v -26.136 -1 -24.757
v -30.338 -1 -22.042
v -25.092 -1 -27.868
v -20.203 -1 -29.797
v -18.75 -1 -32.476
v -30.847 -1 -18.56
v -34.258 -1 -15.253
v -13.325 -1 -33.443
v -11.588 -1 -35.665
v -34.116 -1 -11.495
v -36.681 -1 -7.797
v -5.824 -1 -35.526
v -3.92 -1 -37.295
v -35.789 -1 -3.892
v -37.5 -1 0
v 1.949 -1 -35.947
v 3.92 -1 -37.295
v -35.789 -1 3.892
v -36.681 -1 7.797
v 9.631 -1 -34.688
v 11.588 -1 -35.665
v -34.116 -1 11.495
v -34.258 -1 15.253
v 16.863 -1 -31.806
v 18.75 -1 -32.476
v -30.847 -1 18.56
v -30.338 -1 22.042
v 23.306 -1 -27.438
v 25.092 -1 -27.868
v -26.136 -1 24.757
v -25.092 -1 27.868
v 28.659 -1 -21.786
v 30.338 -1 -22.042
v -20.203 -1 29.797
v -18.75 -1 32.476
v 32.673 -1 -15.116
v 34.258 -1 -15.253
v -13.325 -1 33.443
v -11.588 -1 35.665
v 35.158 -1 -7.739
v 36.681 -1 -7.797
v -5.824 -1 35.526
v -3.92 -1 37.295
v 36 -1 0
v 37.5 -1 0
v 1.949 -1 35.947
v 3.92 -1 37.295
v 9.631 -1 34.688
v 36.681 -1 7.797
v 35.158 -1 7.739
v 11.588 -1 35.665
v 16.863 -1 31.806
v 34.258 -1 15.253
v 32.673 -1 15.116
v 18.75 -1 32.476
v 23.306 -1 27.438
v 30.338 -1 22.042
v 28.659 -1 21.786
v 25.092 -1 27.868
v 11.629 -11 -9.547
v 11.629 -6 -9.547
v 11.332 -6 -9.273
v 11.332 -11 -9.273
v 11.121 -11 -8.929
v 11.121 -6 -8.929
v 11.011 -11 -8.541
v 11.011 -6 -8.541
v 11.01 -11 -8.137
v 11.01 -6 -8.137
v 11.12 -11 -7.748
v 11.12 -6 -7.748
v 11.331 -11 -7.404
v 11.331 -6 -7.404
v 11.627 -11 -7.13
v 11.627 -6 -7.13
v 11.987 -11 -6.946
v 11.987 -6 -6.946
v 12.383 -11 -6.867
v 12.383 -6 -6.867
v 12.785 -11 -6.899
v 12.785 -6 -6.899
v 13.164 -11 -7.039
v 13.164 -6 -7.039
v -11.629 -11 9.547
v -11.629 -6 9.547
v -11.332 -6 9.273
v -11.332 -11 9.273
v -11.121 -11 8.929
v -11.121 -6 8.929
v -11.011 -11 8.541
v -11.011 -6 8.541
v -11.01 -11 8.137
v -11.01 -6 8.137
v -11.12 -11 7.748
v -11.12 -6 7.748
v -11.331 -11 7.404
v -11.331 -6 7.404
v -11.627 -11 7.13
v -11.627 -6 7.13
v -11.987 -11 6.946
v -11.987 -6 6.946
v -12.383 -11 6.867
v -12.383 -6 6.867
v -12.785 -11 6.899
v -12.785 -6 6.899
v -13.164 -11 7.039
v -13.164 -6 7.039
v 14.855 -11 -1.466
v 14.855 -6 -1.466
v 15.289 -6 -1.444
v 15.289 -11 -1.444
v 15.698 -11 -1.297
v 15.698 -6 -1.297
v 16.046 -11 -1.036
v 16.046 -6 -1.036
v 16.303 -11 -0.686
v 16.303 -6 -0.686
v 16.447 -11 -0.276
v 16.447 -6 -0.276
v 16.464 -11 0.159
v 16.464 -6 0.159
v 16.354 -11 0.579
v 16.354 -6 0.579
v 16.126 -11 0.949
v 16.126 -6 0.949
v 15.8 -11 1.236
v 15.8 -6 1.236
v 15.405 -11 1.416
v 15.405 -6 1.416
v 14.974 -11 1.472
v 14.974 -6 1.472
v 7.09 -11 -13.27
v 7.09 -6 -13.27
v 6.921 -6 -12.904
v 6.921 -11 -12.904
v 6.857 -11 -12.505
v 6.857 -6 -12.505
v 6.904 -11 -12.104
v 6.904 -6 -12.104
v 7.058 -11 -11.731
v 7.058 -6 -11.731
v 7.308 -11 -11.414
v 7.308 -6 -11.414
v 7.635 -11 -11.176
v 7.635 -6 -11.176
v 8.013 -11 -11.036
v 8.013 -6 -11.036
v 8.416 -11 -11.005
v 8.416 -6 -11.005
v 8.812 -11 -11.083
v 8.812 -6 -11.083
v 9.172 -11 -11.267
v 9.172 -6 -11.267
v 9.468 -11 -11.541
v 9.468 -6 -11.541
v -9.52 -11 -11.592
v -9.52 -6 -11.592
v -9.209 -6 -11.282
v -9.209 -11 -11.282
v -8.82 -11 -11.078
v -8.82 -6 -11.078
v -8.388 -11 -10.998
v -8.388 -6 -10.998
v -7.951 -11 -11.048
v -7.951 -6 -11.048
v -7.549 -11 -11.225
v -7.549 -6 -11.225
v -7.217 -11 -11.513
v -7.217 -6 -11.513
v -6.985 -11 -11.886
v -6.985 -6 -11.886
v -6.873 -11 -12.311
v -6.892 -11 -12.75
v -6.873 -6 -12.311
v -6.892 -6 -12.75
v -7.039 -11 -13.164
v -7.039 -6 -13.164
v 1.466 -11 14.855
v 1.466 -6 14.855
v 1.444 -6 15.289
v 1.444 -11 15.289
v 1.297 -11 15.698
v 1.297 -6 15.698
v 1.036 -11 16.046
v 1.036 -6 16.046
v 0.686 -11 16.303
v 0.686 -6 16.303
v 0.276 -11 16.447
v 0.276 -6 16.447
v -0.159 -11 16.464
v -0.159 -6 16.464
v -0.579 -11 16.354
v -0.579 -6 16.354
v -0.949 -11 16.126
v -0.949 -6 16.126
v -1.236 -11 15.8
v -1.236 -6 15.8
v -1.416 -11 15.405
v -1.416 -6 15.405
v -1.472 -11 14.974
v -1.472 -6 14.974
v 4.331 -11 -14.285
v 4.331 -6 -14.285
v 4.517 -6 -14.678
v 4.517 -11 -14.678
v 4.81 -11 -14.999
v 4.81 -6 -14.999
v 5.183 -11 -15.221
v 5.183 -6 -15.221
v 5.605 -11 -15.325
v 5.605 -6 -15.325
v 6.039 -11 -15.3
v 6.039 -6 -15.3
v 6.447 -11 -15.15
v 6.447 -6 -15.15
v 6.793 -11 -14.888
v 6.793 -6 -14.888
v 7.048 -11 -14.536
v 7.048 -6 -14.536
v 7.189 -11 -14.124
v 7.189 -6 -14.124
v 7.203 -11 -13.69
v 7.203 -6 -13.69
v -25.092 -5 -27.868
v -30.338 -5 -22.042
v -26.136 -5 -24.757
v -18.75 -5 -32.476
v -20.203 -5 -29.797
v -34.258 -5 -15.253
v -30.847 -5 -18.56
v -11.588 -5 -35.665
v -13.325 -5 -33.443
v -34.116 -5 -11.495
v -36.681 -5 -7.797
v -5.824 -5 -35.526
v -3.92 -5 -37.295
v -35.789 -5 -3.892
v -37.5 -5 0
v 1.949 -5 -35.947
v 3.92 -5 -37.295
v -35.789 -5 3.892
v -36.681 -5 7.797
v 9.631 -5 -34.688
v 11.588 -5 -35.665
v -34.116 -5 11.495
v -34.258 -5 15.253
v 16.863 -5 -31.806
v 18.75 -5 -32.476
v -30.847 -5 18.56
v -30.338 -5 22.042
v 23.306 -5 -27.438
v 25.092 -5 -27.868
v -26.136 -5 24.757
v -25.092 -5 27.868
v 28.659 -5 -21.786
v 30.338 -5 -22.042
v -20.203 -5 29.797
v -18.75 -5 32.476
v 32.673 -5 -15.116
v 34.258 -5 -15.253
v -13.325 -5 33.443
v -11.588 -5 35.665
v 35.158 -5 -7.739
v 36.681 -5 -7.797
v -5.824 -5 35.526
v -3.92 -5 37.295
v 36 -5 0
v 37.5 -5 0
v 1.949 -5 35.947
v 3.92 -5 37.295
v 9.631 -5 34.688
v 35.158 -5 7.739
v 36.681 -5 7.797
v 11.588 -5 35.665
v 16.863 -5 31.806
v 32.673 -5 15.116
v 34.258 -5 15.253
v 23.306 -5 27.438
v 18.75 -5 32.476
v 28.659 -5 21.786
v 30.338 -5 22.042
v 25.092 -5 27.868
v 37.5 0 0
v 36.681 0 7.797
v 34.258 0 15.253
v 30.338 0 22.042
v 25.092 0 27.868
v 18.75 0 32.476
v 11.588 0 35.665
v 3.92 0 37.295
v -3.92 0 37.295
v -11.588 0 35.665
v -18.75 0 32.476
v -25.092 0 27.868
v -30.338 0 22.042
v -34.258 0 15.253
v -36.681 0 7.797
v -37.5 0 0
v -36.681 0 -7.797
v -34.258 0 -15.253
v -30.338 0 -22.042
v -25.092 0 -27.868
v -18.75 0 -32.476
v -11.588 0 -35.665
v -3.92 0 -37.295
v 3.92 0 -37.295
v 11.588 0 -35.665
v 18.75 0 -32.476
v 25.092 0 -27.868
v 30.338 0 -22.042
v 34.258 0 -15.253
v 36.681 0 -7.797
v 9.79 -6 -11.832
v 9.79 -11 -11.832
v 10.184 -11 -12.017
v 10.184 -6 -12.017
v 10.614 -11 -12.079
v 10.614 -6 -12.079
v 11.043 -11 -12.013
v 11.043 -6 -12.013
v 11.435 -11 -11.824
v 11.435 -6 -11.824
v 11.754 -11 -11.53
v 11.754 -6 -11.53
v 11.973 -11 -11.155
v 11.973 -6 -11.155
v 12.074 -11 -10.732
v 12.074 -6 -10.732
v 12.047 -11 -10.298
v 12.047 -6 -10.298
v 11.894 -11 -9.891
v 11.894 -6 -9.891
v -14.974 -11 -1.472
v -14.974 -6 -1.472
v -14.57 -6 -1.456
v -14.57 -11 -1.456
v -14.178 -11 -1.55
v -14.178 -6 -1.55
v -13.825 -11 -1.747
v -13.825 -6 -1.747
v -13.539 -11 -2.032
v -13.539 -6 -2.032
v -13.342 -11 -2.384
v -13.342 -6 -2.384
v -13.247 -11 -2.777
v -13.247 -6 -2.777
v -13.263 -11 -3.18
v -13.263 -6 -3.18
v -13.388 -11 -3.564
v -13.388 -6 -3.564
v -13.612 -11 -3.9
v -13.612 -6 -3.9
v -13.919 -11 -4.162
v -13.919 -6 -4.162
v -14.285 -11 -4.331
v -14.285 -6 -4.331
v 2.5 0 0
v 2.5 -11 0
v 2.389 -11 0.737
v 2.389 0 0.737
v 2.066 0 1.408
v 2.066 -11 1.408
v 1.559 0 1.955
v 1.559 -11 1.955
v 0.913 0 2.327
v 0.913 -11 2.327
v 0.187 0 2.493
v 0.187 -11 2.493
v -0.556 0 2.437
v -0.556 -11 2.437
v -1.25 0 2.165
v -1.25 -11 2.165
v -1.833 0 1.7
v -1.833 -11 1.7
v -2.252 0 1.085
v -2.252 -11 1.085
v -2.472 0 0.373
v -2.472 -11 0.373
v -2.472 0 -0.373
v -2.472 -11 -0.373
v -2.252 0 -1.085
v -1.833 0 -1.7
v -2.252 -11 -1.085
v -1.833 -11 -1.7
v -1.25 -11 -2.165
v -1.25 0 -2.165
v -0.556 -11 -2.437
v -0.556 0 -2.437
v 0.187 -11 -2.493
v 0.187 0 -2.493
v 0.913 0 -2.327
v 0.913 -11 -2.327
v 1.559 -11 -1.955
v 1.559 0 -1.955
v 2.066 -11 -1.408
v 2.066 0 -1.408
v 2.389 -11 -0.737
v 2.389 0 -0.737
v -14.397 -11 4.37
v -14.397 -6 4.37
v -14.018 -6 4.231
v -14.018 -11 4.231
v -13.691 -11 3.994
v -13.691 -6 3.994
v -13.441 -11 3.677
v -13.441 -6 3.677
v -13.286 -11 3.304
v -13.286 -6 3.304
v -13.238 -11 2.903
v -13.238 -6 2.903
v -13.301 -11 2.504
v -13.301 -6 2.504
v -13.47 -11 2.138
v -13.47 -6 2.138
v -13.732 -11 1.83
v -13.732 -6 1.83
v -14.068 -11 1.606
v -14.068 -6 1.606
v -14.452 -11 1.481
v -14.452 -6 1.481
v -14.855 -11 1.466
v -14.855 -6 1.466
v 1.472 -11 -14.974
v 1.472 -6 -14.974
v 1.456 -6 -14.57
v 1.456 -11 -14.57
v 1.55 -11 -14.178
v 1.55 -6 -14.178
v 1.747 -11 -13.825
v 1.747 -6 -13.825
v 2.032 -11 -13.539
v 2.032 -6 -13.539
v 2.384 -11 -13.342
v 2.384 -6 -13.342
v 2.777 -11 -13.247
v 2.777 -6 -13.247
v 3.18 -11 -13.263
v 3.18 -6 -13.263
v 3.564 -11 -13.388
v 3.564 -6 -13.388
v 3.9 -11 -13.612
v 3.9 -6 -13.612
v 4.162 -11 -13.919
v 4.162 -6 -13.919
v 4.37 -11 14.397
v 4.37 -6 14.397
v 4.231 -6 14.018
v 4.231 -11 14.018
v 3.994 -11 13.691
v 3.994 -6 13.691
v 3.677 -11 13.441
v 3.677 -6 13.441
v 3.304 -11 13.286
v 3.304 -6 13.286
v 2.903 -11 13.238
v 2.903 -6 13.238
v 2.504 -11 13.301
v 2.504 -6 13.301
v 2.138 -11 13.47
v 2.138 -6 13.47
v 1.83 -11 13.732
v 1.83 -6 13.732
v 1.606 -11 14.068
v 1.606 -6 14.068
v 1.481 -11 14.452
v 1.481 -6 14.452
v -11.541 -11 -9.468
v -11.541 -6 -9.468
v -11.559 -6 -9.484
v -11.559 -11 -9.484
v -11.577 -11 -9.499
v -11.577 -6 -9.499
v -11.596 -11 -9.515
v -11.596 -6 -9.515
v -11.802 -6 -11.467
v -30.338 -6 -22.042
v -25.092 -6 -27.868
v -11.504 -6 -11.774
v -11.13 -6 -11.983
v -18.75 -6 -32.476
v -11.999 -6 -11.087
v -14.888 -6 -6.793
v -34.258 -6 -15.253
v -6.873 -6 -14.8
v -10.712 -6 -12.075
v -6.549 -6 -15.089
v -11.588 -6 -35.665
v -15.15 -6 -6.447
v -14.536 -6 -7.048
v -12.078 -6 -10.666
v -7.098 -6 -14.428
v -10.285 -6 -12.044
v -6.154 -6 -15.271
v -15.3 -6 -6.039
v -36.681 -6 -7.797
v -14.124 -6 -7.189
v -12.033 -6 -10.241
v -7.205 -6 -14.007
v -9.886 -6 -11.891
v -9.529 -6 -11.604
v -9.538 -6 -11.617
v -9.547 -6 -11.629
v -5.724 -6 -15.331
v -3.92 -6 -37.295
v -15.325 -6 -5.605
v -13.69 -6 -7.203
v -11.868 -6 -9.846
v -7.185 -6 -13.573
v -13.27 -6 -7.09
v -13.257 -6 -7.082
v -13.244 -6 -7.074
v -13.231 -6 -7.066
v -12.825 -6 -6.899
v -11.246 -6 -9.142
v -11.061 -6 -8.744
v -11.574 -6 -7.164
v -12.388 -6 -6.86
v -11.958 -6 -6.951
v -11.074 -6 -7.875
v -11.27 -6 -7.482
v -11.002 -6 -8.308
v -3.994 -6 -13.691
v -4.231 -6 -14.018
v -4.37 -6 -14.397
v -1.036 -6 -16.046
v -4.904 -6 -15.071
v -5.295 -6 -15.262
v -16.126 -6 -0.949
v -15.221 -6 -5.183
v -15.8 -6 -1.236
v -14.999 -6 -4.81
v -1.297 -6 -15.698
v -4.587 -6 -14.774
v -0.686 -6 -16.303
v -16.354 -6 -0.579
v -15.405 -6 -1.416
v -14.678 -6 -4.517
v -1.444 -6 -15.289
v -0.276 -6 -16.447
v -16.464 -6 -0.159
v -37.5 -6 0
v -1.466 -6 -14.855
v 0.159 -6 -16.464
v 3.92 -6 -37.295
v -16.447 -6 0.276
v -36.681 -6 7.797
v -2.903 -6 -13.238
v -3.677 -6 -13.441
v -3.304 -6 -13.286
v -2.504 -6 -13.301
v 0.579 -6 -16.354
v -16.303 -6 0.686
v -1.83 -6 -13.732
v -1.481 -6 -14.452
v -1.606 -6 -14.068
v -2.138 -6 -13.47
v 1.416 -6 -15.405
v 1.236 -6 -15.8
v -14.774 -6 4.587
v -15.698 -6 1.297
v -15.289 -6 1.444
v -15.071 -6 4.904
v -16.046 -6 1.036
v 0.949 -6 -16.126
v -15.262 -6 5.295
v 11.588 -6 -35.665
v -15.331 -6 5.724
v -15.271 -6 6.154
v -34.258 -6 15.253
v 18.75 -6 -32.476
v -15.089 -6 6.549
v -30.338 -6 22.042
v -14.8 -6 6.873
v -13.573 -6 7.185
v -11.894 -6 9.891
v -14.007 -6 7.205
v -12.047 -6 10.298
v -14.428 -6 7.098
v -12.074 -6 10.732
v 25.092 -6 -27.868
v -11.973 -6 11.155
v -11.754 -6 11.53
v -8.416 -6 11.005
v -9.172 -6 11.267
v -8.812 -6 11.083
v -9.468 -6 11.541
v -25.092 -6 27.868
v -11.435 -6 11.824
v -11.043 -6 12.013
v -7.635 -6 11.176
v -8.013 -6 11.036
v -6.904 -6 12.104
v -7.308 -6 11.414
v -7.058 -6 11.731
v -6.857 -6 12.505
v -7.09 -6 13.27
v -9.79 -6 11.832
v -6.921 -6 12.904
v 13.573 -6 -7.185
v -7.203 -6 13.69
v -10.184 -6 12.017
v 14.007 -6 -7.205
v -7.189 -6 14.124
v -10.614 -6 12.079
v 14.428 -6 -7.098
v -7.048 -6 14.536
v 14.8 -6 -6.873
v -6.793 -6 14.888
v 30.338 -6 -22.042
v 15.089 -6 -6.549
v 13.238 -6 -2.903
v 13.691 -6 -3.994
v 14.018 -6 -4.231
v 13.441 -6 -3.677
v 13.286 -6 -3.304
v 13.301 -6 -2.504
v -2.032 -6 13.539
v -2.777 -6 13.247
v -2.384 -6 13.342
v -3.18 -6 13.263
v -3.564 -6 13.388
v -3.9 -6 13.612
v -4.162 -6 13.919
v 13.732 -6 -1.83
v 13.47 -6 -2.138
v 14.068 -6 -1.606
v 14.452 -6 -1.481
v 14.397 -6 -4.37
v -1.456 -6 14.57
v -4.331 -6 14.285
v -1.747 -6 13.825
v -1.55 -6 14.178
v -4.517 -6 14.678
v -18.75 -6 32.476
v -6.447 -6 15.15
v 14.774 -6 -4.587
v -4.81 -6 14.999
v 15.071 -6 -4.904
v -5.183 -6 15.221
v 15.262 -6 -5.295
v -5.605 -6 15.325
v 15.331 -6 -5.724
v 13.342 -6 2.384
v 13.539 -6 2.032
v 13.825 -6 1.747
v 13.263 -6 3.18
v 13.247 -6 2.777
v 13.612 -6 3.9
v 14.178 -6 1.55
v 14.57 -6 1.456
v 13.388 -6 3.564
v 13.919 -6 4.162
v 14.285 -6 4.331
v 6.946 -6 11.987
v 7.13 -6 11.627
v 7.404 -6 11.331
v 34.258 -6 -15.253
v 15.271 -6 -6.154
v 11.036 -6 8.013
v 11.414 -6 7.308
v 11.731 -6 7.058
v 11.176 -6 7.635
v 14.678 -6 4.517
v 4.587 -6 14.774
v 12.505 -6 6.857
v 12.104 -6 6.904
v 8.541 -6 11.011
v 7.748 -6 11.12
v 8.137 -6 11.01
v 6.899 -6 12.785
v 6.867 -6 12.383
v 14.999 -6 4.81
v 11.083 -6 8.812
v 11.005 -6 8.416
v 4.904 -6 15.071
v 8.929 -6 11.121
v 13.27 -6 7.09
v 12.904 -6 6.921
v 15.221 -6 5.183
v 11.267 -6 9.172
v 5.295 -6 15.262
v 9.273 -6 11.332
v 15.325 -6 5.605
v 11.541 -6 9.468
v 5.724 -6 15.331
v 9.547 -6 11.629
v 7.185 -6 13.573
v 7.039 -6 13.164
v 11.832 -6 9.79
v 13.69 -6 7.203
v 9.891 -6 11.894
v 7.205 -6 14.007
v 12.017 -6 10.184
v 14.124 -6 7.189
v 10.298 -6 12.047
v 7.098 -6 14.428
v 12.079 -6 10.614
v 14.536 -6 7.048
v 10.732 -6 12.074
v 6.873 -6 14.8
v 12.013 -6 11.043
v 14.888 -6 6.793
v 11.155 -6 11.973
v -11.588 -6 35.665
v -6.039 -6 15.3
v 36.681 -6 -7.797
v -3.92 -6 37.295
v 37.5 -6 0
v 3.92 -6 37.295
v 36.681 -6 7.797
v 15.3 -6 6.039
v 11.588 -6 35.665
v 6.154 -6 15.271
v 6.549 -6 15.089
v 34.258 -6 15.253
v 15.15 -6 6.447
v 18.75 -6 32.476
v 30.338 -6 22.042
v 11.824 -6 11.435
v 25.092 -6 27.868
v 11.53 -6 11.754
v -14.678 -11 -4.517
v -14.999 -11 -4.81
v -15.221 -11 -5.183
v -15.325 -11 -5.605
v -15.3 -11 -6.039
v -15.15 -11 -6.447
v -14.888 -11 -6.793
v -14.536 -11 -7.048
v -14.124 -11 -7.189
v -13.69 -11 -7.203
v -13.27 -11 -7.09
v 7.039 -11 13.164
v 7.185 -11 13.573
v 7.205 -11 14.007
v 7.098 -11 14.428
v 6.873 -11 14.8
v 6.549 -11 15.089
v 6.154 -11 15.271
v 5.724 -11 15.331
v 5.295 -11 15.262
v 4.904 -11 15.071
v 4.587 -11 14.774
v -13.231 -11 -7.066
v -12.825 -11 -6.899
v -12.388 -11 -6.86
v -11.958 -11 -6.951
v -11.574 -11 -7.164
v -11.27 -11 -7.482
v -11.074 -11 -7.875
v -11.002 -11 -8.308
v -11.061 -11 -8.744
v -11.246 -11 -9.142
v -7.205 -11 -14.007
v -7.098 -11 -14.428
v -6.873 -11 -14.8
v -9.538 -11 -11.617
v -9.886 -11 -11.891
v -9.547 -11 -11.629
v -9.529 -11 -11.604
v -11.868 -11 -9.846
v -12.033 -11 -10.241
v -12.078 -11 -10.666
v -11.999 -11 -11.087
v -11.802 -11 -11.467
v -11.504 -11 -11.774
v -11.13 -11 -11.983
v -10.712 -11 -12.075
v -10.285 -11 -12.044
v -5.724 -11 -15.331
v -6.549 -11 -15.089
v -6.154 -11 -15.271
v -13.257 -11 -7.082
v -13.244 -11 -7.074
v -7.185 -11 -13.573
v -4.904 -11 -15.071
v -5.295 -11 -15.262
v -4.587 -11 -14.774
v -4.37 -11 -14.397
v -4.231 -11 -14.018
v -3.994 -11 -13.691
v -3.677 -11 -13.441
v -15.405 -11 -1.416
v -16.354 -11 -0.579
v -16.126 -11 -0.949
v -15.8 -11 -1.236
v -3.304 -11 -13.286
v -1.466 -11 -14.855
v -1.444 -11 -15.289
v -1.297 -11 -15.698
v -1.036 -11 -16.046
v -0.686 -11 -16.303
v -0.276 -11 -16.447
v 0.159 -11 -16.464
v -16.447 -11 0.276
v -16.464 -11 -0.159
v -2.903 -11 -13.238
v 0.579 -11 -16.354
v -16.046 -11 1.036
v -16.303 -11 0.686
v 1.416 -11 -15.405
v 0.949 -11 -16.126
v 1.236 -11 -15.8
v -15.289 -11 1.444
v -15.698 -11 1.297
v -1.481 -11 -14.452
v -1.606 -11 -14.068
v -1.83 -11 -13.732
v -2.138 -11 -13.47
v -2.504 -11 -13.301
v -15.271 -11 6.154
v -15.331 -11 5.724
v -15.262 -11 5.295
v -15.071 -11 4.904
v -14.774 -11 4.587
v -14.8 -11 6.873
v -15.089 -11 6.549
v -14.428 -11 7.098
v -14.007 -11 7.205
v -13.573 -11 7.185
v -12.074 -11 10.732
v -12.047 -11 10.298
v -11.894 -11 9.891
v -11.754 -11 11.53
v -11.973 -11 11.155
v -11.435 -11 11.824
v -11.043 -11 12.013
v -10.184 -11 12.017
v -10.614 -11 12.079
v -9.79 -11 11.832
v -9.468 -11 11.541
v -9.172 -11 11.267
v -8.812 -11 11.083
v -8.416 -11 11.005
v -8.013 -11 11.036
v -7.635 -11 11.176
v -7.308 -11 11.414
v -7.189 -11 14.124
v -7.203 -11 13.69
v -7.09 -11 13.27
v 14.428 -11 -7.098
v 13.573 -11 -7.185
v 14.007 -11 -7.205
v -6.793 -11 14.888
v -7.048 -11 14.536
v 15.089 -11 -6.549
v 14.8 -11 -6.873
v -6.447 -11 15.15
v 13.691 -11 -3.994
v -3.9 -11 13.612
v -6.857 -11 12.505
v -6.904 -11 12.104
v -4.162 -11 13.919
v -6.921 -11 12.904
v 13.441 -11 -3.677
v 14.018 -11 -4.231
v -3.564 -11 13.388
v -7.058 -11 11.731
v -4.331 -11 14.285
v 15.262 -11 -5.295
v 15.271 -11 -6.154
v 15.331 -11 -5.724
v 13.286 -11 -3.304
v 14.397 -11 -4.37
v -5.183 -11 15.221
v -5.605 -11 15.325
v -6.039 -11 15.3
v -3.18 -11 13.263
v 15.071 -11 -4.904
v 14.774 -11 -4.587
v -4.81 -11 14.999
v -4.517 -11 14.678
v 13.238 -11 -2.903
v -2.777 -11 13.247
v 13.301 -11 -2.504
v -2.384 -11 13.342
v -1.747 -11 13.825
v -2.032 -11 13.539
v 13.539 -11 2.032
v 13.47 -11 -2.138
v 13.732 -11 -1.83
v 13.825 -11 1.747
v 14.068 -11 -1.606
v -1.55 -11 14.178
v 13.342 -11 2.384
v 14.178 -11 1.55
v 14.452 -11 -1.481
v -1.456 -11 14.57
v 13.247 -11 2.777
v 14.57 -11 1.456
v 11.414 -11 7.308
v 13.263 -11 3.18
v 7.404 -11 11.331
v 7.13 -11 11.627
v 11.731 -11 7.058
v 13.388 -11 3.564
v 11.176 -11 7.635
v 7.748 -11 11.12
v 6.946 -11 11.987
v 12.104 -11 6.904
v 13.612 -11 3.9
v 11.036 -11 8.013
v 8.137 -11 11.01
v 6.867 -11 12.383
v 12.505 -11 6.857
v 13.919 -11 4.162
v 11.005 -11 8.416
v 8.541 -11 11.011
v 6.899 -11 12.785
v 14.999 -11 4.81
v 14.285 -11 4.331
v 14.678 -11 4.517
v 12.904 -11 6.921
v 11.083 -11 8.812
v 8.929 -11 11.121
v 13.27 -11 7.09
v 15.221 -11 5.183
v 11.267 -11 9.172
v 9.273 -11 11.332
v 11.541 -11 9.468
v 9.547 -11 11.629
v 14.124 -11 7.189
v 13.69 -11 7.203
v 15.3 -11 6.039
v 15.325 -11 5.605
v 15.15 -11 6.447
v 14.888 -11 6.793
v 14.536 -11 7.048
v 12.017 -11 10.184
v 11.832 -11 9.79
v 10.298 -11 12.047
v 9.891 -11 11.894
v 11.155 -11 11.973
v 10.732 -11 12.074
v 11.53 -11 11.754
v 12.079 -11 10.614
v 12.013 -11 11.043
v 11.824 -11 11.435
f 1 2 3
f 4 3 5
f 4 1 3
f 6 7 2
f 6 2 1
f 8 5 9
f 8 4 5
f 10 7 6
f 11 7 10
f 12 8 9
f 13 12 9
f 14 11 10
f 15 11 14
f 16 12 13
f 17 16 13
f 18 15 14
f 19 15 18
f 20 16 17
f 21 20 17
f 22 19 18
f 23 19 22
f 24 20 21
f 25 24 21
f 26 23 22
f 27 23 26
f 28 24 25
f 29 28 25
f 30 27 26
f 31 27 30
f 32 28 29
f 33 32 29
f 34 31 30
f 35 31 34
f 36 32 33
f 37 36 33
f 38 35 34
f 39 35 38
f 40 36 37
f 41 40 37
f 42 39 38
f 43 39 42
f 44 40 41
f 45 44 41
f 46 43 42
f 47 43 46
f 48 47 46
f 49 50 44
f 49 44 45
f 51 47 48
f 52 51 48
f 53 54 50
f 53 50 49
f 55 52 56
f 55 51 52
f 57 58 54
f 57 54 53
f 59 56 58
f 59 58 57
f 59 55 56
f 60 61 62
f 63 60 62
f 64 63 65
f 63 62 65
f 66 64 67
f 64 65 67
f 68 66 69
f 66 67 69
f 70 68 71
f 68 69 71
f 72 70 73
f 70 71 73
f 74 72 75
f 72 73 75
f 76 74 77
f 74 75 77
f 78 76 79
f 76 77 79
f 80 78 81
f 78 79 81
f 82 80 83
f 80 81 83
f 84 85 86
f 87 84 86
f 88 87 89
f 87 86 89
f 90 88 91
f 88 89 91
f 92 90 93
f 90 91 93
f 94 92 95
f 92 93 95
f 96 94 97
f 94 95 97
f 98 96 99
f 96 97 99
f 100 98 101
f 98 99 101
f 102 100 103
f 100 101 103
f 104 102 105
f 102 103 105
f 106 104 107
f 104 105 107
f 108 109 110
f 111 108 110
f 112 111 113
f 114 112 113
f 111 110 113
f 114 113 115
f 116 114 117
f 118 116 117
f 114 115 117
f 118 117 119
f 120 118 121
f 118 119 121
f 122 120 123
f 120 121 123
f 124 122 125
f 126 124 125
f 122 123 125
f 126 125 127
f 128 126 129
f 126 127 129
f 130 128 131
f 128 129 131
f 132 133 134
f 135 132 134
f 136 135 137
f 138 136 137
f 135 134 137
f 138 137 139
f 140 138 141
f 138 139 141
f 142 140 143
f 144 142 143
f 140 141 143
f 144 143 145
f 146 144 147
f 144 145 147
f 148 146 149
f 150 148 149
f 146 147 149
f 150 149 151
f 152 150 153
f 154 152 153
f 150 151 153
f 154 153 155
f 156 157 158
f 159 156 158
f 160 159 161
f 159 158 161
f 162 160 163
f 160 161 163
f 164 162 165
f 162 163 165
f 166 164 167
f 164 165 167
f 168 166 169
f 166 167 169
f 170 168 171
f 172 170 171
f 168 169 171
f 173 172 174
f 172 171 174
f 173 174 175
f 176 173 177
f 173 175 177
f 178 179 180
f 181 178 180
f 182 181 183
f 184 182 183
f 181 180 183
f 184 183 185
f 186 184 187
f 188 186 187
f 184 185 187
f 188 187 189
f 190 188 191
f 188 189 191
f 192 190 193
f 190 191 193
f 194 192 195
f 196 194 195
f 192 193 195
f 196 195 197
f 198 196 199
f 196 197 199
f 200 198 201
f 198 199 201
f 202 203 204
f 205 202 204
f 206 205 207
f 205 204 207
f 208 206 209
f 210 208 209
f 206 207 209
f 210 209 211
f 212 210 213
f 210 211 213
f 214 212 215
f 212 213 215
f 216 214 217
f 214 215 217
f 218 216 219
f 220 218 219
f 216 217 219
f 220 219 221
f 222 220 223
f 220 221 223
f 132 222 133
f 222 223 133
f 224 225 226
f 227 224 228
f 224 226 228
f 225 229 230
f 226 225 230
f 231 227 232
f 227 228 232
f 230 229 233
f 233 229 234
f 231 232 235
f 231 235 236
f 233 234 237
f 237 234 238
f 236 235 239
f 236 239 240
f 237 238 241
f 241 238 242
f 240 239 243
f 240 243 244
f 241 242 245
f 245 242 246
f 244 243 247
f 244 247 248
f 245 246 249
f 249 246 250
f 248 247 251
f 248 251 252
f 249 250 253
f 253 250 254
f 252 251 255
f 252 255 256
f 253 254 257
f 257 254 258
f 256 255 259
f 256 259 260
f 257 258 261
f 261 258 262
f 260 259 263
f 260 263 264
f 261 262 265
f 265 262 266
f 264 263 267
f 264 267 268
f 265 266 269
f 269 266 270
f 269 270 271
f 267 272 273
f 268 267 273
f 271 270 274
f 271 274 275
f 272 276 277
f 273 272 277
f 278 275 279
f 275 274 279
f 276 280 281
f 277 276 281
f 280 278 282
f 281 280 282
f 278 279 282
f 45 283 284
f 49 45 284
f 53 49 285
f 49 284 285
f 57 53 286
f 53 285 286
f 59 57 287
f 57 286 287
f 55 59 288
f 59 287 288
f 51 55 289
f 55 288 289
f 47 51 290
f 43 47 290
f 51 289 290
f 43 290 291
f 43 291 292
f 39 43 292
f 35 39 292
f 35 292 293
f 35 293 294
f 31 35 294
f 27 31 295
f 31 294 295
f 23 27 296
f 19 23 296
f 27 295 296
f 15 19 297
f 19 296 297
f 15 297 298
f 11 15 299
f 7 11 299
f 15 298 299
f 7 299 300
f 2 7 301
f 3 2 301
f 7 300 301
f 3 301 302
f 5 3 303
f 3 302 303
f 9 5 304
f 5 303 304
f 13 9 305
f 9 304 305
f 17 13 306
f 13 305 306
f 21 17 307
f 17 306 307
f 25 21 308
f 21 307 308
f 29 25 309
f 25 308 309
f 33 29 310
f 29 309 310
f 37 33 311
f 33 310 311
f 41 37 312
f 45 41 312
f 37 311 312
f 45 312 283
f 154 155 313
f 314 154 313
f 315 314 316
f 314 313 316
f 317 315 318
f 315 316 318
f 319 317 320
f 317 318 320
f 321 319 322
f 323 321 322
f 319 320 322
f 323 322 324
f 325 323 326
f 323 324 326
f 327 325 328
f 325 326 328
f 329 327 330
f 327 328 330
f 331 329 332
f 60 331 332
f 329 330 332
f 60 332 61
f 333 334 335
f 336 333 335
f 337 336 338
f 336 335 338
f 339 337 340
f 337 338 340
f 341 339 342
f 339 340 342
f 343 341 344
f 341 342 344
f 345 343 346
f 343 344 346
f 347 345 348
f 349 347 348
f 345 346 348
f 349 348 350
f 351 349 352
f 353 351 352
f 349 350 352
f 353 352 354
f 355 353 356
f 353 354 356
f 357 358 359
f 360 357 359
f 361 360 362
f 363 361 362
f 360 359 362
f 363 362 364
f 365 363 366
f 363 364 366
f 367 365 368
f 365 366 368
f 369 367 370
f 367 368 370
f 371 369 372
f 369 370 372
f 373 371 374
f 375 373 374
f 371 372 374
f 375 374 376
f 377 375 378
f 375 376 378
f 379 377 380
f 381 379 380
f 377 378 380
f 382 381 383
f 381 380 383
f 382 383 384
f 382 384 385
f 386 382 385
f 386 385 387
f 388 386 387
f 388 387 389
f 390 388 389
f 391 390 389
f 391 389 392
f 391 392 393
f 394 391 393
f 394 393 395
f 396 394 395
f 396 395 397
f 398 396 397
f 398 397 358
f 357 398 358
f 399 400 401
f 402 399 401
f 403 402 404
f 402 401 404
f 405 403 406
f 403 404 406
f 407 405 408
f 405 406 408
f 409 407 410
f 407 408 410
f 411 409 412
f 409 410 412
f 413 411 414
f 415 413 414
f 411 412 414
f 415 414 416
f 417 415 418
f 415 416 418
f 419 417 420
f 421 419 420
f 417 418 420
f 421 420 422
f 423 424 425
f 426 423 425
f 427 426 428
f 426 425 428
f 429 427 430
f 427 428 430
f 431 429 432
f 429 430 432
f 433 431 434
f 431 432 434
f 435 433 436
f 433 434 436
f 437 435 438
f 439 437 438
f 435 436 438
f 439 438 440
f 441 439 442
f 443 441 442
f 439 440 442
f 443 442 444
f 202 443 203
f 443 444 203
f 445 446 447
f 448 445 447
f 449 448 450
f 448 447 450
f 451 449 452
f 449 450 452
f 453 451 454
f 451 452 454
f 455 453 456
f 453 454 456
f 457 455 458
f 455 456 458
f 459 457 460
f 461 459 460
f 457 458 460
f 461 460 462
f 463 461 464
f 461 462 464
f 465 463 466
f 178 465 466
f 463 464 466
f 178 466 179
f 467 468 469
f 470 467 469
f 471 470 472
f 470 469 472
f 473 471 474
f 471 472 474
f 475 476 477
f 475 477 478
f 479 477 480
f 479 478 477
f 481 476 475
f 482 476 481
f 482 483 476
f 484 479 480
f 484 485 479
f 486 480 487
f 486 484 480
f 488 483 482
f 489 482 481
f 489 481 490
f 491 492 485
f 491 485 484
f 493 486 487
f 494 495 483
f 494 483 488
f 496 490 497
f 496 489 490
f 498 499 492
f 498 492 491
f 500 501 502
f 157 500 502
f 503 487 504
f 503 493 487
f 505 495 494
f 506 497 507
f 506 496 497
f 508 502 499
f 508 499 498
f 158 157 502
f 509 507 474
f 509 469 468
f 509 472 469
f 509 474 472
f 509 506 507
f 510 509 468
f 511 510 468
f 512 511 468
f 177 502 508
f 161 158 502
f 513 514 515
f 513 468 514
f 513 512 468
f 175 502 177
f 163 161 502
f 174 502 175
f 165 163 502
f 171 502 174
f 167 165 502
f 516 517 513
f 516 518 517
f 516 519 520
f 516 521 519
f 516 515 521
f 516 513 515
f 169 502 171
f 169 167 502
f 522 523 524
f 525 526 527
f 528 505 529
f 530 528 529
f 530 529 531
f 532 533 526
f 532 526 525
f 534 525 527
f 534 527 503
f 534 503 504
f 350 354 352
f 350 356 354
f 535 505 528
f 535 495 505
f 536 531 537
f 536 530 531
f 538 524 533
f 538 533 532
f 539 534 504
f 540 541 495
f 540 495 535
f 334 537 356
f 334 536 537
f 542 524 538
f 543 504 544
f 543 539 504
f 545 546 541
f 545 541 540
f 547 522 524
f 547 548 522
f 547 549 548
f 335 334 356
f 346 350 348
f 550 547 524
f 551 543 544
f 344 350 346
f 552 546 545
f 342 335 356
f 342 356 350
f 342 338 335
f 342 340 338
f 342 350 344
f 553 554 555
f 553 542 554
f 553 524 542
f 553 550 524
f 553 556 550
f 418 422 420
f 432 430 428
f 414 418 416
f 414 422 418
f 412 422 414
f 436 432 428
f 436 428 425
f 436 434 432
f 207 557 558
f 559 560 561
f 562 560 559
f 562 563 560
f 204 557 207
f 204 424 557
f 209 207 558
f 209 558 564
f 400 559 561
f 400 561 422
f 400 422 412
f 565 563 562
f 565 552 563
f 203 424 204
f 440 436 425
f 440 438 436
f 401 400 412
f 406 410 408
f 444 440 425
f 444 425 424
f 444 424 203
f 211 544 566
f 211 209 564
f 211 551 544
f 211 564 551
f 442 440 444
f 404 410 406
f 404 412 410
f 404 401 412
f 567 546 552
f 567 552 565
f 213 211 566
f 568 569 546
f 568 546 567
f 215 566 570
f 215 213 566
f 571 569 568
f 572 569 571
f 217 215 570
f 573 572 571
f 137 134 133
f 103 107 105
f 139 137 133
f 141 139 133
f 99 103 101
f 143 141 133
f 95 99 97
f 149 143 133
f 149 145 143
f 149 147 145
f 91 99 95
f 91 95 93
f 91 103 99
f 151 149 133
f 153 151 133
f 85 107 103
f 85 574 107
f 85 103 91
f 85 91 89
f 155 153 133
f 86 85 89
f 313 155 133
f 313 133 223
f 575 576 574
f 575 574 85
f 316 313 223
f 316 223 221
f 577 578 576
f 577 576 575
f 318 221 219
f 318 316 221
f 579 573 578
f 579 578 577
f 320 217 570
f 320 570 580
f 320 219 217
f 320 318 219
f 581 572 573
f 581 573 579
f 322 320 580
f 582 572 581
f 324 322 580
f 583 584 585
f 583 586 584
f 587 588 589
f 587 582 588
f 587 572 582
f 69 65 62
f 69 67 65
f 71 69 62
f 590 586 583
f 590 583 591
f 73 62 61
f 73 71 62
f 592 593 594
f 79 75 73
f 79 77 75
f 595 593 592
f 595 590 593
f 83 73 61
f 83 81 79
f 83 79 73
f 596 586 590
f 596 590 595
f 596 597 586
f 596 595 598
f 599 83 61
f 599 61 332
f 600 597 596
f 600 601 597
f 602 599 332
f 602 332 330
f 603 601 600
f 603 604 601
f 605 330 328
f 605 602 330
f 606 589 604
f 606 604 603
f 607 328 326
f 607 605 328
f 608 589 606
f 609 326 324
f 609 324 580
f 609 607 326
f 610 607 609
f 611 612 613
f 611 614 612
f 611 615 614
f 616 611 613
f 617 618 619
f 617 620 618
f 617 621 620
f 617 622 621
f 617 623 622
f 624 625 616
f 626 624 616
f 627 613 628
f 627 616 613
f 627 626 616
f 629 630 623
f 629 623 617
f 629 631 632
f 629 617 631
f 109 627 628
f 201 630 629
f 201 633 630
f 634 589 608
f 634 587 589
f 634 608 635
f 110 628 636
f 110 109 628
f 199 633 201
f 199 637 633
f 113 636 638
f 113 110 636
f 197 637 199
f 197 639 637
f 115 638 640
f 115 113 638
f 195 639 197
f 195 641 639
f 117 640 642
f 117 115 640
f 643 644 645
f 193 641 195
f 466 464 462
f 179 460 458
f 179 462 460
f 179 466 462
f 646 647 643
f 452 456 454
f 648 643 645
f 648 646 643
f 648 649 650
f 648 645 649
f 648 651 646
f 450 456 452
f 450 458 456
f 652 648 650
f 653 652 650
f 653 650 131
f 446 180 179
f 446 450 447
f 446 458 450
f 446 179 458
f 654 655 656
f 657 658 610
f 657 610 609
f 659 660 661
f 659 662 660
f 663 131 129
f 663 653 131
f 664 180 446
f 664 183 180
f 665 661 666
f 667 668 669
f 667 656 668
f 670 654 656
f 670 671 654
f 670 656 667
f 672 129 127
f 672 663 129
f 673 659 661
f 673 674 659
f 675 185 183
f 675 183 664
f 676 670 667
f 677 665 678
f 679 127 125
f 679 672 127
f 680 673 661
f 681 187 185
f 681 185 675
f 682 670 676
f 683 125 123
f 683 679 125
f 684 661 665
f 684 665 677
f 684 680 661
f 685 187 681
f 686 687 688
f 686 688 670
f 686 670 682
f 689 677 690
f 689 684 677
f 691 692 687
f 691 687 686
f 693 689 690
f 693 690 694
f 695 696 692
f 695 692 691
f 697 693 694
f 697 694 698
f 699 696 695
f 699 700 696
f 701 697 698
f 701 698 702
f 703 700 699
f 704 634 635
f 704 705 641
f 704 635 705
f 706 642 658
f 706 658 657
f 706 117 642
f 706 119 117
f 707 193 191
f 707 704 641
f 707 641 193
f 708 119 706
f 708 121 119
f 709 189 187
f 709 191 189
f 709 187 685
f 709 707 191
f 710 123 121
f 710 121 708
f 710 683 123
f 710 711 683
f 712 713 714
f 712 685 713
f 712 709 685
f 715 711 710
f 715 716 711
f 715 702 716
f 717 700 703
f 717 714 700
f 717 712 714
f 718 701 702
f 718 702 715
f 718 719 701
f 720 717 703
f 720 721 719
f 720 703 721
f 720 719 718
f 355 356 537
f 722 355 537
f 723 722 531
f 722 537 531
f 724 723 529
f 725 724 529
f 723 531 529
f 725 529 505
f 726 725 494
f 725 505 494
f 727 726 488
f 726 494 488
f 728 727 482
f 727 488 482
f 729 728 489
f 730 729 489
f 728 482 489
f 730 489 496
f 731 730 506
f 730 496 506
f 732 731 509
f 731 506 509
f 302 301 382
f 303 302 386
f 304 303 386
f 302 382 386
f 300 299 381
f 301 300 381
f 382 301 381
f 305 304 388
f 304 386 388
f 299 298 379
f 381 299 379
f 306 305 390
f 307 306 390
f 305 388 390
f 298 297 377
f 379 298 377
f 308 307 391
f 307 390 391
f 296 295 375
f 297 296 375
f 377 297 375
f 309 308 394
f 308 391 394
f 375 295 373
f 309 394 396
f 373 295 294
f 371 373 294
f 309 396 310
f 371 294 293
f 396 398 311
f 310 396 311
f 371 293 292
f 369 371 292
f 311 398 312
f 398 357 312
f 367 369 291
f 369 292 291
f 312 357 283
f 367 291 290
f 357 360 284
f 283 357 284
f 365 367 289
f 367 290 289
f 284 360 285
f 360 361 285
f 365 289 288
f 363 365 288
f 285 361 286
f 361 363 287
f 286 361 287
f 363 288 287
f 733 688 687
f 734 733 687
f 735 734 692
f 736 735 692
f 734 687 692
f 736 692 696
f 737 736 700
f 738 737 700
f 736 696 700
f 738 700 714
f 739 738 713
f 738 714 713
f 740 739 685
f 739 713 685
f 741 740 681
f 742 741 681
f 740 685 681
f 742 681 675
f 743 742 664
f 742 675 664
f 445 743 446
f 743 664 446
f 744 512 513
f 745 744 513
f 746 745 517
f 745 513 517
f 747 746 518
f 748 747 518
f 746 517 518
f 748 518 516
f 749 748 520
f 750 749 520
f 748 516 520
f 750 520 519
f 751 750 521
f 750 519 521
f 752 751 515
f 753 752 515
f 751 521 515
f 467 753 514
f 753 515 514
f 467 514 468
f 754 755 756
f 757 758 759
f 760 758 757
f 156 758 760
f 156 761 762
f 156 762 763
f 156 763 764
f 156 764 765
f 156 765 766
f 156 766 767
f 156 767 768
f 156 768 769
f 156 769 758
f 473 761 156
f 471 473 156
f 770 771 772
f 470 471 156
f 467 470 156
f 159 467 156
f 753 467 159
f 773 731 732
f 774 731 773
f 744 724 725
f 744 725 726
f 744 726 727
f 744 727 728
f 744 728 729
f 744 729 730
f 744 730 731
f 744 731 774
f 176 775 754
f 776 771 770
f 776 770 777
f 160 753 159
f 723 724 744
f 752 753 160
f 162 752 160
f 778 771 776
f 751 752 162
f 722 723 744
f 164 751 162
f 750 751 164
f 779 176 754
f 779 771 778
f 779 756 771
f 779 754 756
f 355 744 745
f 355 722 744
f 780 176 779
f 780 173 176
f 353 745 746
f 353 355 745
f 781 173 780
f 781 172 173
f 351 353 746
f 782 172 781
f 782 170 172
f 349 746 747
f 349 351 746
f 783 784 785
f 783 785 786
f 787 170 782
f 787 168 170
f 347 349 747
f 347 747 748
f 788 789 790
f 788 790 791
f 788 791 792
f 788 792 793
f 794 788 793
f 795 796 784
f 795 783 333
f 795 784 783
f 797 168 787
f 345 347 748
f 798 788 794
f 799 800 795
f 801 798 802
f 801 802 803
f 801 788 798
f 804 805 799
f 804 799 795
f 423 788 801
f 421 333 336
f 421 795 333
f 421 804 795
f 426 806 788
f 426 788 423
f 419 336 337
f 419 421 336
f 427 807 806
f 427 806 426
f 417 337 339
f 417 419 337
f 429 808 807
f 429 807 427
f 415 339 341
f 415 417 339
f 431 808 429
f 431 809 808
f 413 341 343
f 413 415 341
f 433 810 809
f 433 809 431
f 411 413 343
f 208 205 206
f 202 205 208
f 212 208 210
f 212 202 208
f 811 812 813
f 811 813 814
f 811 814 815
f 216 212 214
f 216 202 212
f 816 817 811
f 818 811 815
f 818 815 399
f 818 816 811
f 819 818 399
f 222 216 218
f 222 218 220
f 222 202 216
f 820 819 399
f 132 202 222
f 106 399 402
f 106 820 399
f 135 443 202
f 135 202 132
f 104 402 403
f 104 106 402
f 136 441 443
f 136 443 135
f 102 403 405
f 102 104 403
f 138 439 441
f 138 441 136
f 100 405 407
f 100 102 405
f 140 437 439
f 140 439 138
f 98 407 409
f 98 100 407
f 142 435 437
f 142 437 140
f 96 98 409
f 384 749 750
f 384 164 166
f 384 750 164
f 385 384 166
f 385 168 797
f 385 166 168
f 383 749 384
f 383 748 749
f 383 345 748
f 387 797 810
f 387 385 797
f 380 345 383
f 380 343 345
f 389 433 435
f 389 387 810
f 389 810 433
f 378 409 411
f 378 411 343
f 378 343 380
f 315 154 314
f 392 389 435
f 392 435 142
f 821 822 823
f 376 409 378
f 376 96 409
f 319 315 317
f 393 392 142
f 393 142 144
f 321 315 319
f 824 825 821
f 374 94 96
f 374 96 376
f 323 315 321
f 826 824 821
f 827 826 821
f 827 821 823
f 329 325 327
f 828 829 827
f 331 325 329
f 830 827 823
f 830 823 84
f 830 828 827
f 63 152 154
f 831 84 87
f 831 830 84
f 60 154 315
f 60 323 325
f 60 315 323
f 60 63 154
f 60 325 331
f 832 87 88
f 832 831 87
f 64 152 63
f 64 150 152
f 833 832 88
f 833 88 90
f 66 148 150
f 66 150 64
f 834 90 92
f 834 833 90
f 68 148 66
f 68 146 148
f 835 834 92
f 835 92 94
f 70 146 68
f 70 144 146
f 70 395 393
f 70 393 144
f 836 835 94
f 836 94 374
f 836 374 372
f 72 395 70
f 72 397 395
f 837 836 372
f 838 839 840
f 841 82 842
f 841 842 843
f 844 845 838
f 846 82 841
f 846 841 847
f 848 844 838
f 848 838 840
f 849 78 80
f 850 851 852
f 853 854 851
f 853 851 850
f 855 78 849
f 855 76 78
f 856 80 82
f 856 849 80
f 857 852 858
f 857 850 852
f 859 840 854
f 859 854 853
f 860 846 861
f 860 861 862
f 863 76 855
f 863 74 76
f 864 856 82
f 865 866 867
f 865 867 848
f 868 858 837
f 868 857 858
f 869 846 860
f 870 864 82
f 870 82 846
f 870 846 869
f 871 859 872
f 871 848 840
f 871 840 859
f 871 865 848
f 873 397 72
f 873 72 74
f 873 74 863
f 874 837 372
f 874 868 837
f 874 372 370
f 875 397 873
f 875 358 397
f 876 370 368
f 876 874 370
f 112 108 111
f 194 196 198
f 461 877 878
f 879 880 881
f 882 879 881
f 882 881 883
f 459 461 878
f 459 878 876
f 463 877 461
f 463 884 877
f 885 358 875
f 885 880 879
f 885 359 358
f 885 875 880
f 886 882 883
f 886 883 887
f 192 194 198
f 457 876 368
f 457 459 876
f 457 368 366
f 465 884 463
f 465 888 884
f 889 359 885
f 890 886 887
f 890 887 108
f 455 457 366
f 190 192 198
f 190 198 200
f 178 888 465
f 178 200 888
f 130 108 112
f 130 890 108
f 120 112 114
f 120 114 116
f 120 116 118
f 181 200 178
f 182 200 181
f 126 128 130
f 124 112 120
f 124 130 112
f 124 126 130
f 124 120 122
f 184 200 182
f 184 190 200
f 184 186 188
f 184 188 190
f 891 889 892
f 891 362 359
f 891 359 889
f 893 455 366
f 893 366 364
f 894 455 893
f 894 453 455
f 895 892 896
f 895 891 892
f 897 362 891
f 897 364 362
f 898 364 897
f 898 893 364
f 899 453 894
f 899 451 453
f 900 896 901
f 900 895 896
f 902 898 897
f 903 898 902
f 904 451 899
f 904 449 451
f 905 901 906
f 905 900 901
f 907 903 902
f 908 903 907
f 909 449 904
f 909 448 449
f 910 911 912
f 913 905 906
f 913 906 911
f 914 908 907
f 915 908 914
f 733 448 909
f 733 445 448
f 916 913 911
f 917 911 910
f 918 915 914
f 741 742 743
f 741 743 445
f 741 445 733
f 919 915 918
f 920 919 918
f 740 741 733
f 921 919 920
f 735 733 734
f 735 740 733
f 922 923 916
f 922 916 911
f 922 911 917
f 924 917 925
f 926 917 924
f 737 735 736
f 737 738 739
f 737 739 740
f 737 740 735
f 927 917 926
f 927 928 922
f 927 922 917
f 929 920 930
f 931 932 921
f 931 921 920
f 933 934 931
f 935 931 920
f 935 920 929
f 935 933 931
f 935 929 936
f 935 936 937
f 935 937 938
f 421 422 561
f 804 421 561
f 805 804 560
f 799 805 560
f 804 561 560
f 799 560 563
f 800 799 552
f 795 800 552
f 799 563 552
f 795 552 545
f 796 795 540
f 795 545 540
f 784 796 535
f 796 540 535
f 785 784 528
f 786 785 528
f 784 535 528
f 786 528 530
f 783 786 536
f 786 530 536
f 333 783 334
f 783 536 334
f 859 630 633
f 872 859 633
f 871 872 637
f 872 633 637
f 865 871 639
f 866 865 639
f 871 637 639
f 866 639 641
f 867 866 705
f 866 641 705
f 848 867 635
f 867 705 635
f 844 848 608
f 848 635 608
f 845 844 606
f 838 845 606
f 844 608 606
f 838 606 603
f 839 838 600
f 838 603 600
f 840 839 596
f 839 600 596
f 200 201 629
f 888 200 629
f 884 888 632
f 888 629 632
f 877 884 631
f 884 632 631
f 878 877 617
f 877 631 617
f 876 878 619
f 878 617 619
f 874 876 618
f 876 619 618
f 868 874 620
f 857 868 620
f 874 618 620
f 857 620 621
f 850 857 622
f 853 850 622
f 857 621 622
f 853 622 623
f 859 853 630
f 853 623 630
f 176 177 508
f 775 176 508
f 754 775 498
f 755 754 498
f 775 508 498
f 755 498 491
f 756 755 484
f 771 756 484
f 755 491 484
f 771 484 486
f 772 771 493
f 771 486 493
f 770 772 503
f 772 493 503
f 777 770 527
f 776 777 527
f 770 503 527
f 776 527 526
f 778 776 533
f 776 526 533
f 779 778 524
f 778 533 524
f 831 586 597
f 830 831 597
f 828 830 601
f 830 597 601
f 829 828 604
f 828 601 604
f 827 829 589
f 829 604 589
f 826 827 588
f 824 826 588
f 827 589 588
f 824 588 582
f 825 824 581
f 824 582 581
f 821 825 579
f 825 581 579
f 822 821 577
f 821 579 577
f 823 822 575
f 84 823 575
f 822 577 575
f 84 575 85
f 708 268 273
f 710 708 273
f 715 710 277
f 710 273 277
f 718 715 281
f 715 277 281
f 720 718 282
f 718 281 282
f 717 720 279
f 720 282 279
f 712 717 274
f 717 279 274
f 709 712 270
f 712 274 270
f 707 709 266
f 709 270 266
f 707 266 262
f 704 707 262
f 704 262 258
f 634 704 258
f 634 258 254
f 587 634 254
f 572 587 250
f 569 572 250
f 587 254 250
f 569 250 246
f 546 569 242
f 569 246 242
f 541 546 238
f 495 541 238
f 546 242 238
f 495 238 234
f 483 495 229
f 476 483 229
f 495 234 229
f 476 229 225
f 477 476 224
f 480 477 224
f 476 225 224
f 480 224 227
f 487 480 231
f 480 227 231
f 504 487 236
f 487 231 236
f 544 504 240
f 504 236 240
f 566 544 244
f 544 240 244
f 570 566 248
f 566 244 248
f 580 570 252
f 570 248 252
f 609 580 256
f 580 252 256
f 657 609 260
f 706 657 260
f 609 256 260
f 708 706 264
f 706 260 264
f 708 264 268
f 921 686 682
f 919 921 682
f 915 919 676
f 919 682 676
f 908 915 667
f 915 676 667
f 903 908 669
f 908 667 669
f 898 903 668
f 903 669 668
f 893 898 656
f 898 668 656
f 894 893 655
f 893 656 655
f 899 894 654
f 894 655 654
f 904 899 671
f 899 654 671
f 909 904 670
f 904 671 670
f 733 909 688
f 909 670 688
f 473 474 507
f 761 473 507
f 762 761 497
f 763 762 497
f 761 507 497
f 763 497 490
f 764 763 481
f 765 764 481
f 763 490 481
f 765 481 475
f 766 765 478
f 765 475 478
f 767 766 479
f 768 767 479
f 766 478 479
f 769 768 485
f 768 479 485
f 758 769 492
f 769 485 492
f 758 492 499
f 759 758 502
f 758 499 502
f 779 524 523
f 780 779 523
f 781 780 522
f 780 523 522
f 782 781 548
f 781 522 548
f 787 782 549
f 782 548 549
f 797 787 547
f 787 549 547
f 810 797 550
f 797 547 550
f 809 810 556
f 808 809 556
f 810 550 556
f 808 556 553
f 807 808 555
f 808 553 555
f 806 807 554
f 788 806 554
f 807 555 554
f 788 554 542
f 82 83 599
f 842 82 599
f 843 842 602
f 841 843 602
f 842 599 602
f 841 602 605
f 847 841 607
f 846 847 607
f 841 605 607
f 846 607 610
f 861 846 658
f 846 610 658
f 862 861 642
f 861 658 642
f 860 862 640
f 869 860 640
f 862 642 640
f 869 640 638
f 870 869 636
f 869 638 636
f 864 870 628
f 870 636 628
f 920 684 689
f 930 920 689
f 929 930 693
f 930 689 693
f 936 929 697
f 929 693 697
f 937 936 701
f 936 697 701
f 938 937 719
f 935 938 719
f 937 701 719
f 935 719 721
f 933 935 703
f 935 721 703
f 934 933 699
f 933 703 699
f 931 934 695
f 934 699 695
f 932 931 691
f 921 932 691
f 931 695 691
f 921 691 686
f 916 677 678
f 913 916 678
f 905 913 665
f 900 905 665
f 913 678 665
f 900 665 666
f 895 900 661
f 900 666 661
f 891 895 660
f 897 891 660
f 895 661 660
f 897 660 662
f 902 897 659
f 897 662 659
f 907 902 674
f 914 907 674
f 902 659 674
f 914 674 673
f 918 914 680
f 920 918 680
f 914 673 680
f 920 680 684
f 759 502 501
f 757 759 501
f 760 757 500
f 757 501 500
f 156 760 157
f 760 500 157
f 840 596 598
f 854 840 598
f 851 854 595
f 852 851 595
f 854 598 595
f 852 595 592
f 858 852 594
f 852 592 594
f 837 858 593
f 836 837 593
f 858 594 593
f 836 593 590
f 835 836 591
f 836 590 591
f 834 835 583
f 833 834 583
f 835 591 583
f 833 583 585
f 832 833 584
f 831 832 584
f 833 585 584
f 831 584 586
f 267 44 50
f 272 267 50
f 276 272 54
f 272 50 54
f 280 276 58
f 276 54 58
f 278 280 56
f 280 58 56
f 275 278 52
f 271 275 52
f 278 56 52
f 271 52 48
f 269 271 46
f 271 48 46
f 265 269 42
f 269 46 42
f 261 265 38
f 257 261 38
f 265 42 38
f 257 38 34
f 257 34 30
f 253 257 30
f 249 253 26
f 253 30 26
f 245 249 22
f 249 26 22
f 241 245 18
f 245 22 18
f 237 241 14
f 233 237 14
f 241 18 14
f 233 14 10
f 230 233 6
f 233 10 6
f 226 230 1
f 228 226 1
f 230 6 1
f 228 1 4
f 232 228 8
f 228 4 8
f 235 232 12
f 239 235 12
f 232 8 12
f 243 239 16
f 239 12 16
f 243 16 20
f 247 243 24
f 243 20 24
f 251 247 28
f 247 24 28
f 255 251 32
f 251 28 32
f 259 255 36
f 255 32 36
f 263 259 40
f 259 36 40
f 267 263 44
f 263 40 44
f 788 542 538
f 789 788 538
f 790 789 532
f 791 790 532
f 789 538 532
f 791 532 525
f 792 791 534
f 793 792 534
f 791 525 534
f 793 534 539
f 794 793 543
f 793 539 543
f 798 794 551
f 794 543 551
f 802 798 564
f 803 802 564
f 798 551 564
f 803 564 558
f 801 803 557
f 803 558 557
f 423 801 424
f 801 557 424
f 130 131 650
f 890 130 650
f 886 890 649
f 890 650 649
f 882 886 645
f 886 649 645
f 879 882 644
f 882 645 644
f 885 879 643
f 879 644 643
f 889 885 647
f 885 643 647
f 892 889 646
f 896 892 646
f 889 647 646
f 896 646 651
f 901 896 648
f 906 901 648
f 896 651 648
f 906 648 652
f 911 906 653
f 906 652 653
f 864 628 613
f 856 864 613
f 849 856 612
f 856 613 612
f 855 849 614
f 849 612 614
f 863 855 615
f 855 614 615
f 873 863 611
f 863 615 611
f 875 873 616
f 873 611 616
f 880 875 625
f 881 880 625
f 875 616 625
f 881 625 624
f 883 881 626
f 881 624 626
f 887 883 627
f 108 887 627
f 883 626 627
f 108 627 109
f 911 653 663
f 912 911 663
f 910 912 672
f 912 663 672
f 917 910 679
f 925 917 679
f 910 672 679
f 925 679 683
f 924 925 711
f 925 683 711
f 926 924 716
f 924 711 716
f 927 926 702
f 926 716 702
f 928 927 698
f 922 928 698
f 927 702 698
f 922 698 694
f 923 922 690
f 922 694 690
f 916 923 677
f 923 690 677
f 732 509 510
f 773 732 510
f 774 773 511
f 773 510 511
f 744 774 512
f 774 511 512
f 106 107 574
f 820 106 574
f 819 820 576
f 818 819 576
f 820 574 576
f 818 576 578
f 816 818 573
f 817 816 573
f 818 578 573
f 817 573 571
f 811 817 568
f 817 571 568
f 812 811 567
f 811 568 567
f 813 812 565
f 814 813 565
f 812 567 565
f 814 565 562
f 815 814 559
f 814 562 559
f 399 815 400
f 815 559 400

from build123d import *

# Parameters (mm, degrees)
F0_R      = 37.5
F1_DEPTH  = 1
F2_R      = 36
F3_DEPTH  = 4
F4_R      = 37.5
F4_R_2    = 36
F5_DEPTH  = 1
F7_DEPTH  = 6
F8_DEPTH  = 1
F9_R      = 2.5
F10_DEPTH = 20


with BuildPart() as f1:
    # F0 (on Front) → F1 (new body)
    with BuildSketch(Plane.XZ):
        Circle(F0_R)
    extrude(amount=F1_DEPTH)

    # F2 (on face) → F3 (join)
    with BuildSketch(Plane.XZ.offset(1)):
        Circle(F2_R)
    extrude(amount=F3_DEPTH)

    # F4 (on face) → F5 (join)
    with BuildSketch(Plane.XZ.offset(5)):
        Circle(F4_R)
        Circle(F4_R_2, mode=Mode.SUBTRACT)
    extrude(amount=F5_DEPTH)

    # F6 (on face) → F7 (join)
    with BuildSketch(Plane.XZ.offset(5)):
        with BuildLine():
            ThreePointArc((-14.3973607657, 4.3698820625), (-13.2562102609, 2.7015956993), (-14.8554257168, 1.4655075997))
            ThreePointArc((-14.8554257168, 1.4655075997), (-16.4714294815, 0.0592412802), (-14.9737084003, -1.4723868378))
            ThreePointArc((-14.9737084003, -1.4723868378), (-13.2809972538, -2.5769830711), (-14.2854492449, -4.3309728264))
            ThreePointArc((-14.2854492449, -4.3309728264), (-15.2402872256, -6.2486113636), (-13.270444668, -7.0904981892))
            ThreePointArc((-13.270444668, -7.0904981892), (-13.2509857133, -7.078215185), (-13.2313372043, -7.0662377391))
            ThreePointArc((-13.2313372043, -7.0662377391), (-11.2704807141, -7.4819524915), (-11.5406426234, -9.4681019001))
            ThreePointArc((-11.5406426234, -9.4681019001), (-11.5683788085, -9.4914339833), (-11.5955323776, -9.515441602))
            ThreePointArc((-11.5955323776, -9.515441602), (-11.6640462748, -11.6315042777), (-9.5468760318, -11.6291454669))
            ThreePointArc((-9.5468760318, -11.6291454669), (-9.5335988041, -11.6103508311), (-9.5200295189, -11.5917659551))
            ThreePointArc((-9.5200295189, -11.5917659551), (-7.5493471931, -11.2254490142), (-7.0388777787, -13.163798288))
            ThreePointArc((-7.0388777787, -13.163798288), (-6.3580749762, -15.1949459127), (-4.3698820625, -14.3973607657))
            ThreePointArc((-4.3698820625, -14.3973607657), (-2.7015956993, -13.2562102609), (-1.4655075997, -14.8554257168))
            ThreePointArc((-1.4655075997, -14.8554257168), (-0.0592412802, -16.4714294815), (1.4723868378, -14.9737084003))
            ThreePointArc((1.4723868378, -14.9737084003), (2.5769830711, -13.2809972538), (4.3309728264, -14.2854492449))
            ThreePointArc((4.3309728264, -14.2854492449), (6.2486113636, -15.2402872256), (7.0904981892, -13.270444668))
            ThreePointArc((7.0904981892, -13.270444668), (7.4632395293, -11.2838728073), (9.4681019001, -11.5406426234))
            ThreePointArc((9.4681019001, -11.5406426234), (11.6051695712, -11.6889493932), (11.6291454669, -9.5468760318))
            ThreePointArc((11.6291454669, -9.5468760318), (11.2132854236, -7.5688810145), (13.163798288, -7.0388777787))
            ThreePointArc((13.163798288, -7.0388777787), (15.1949459127, -6.3580749762), (14.3973607657, -4.3698820625))
            ThreePointArc((14.3973607657, -4.3698820625), (13.2562102609, -2.7015956993), (14.8554257168, -1.4655075997))
            ThreePointArc((14.8554257168, -1.4655075997), (16.4714294815, -0.0592412802), (14.9737084003, 1.4723868378))
            ThreePointArc((14.9737084003, 1.4723868378), (13.2809972538, 2.5769830711), (14.2854492449, 4.3309728264))
            ThreePointArc((14.2854492449, 4.3309728264), (15.2402872256, 6.2486113636), (13.270444668, 7.0904981892))
            ThreePointArc((13.270444668, 7.0904981892), (11.2838728073, 7.4632395293), (11.5406426234, 9.4681019001))
            ThreePointArc((11.5406426234, 9.4681019001), (11.6889493932, 11.6051695712), (9.5468760318, 11.6291454669))
            ThreePointArc((9.5468760318, 11.6291454669), (7.5688810145, 11.2132854236), (7.0388777787, 13.163798288))
            ThreePointArc((7.0388777787, 13.163798288), (6.3580749762, 15.1949459127), (4.3698820625, 14.3973607657))
            ThreePointArc((4.3698820625, 14.3973607657), (2.7015956993, 13.2562102609), (1.4655075997, 14.8554257168))
            ThreePointArc((1.4655075997, 14.8554257168), (0.0592412802, 16.4714294815), (-1.4723868378, 14.9737084003))
            ThreePointArc((-1.4723868378, 14.9737084003), (-2.5769830711, 13.2809972538), (-4.3309728264, 14.2854492449))
            ThreePointArc((-4.3309728264, 14.2854492449), (-6.2486113636, 15.2402872256), (-7.0904981892, 13.270444668))
            ThreePointArc((-7.0904981892, 13.270444668), (-7.4632395293, 11.2838728073), (-9.4681019001, 11.5406426234))
            ThreePointArc((-9.4681019001, 11.5406426234), (-11.6051695712, 11.6889493932), (-11.6291454669, 9.5468760318))
            ThreePointArc((-11.6291454669, 9.5468760318), (-11.2132854236, 7.5688810145), (-13.163798288, 7.0388777787))
            ThreePointArc((-13.163798288, 7.0388777787), (-15.1949459127, 6.3580749762), (-14.3973607657, 4.3698820625))
        make_face()
    extrude(amount=F7_DEPTH)

    # F8 (add): a face of the model
    f8_faces = [f1.faces().sort_by_distance(p)[0] for p in [
        (-34.9817662351, -5, 0),
    ]]
    extrude(f8_faces, amount=F8_DEPTH)

    # F9 (on face) → F10 (cut)
    with BuildSketch(Plane.XZ.offset(11)):
        Circle(F9_R)
    extrude(amount=-F10_DEPTH, mode=Mode.SUBTRACT)


solid = f1.part
